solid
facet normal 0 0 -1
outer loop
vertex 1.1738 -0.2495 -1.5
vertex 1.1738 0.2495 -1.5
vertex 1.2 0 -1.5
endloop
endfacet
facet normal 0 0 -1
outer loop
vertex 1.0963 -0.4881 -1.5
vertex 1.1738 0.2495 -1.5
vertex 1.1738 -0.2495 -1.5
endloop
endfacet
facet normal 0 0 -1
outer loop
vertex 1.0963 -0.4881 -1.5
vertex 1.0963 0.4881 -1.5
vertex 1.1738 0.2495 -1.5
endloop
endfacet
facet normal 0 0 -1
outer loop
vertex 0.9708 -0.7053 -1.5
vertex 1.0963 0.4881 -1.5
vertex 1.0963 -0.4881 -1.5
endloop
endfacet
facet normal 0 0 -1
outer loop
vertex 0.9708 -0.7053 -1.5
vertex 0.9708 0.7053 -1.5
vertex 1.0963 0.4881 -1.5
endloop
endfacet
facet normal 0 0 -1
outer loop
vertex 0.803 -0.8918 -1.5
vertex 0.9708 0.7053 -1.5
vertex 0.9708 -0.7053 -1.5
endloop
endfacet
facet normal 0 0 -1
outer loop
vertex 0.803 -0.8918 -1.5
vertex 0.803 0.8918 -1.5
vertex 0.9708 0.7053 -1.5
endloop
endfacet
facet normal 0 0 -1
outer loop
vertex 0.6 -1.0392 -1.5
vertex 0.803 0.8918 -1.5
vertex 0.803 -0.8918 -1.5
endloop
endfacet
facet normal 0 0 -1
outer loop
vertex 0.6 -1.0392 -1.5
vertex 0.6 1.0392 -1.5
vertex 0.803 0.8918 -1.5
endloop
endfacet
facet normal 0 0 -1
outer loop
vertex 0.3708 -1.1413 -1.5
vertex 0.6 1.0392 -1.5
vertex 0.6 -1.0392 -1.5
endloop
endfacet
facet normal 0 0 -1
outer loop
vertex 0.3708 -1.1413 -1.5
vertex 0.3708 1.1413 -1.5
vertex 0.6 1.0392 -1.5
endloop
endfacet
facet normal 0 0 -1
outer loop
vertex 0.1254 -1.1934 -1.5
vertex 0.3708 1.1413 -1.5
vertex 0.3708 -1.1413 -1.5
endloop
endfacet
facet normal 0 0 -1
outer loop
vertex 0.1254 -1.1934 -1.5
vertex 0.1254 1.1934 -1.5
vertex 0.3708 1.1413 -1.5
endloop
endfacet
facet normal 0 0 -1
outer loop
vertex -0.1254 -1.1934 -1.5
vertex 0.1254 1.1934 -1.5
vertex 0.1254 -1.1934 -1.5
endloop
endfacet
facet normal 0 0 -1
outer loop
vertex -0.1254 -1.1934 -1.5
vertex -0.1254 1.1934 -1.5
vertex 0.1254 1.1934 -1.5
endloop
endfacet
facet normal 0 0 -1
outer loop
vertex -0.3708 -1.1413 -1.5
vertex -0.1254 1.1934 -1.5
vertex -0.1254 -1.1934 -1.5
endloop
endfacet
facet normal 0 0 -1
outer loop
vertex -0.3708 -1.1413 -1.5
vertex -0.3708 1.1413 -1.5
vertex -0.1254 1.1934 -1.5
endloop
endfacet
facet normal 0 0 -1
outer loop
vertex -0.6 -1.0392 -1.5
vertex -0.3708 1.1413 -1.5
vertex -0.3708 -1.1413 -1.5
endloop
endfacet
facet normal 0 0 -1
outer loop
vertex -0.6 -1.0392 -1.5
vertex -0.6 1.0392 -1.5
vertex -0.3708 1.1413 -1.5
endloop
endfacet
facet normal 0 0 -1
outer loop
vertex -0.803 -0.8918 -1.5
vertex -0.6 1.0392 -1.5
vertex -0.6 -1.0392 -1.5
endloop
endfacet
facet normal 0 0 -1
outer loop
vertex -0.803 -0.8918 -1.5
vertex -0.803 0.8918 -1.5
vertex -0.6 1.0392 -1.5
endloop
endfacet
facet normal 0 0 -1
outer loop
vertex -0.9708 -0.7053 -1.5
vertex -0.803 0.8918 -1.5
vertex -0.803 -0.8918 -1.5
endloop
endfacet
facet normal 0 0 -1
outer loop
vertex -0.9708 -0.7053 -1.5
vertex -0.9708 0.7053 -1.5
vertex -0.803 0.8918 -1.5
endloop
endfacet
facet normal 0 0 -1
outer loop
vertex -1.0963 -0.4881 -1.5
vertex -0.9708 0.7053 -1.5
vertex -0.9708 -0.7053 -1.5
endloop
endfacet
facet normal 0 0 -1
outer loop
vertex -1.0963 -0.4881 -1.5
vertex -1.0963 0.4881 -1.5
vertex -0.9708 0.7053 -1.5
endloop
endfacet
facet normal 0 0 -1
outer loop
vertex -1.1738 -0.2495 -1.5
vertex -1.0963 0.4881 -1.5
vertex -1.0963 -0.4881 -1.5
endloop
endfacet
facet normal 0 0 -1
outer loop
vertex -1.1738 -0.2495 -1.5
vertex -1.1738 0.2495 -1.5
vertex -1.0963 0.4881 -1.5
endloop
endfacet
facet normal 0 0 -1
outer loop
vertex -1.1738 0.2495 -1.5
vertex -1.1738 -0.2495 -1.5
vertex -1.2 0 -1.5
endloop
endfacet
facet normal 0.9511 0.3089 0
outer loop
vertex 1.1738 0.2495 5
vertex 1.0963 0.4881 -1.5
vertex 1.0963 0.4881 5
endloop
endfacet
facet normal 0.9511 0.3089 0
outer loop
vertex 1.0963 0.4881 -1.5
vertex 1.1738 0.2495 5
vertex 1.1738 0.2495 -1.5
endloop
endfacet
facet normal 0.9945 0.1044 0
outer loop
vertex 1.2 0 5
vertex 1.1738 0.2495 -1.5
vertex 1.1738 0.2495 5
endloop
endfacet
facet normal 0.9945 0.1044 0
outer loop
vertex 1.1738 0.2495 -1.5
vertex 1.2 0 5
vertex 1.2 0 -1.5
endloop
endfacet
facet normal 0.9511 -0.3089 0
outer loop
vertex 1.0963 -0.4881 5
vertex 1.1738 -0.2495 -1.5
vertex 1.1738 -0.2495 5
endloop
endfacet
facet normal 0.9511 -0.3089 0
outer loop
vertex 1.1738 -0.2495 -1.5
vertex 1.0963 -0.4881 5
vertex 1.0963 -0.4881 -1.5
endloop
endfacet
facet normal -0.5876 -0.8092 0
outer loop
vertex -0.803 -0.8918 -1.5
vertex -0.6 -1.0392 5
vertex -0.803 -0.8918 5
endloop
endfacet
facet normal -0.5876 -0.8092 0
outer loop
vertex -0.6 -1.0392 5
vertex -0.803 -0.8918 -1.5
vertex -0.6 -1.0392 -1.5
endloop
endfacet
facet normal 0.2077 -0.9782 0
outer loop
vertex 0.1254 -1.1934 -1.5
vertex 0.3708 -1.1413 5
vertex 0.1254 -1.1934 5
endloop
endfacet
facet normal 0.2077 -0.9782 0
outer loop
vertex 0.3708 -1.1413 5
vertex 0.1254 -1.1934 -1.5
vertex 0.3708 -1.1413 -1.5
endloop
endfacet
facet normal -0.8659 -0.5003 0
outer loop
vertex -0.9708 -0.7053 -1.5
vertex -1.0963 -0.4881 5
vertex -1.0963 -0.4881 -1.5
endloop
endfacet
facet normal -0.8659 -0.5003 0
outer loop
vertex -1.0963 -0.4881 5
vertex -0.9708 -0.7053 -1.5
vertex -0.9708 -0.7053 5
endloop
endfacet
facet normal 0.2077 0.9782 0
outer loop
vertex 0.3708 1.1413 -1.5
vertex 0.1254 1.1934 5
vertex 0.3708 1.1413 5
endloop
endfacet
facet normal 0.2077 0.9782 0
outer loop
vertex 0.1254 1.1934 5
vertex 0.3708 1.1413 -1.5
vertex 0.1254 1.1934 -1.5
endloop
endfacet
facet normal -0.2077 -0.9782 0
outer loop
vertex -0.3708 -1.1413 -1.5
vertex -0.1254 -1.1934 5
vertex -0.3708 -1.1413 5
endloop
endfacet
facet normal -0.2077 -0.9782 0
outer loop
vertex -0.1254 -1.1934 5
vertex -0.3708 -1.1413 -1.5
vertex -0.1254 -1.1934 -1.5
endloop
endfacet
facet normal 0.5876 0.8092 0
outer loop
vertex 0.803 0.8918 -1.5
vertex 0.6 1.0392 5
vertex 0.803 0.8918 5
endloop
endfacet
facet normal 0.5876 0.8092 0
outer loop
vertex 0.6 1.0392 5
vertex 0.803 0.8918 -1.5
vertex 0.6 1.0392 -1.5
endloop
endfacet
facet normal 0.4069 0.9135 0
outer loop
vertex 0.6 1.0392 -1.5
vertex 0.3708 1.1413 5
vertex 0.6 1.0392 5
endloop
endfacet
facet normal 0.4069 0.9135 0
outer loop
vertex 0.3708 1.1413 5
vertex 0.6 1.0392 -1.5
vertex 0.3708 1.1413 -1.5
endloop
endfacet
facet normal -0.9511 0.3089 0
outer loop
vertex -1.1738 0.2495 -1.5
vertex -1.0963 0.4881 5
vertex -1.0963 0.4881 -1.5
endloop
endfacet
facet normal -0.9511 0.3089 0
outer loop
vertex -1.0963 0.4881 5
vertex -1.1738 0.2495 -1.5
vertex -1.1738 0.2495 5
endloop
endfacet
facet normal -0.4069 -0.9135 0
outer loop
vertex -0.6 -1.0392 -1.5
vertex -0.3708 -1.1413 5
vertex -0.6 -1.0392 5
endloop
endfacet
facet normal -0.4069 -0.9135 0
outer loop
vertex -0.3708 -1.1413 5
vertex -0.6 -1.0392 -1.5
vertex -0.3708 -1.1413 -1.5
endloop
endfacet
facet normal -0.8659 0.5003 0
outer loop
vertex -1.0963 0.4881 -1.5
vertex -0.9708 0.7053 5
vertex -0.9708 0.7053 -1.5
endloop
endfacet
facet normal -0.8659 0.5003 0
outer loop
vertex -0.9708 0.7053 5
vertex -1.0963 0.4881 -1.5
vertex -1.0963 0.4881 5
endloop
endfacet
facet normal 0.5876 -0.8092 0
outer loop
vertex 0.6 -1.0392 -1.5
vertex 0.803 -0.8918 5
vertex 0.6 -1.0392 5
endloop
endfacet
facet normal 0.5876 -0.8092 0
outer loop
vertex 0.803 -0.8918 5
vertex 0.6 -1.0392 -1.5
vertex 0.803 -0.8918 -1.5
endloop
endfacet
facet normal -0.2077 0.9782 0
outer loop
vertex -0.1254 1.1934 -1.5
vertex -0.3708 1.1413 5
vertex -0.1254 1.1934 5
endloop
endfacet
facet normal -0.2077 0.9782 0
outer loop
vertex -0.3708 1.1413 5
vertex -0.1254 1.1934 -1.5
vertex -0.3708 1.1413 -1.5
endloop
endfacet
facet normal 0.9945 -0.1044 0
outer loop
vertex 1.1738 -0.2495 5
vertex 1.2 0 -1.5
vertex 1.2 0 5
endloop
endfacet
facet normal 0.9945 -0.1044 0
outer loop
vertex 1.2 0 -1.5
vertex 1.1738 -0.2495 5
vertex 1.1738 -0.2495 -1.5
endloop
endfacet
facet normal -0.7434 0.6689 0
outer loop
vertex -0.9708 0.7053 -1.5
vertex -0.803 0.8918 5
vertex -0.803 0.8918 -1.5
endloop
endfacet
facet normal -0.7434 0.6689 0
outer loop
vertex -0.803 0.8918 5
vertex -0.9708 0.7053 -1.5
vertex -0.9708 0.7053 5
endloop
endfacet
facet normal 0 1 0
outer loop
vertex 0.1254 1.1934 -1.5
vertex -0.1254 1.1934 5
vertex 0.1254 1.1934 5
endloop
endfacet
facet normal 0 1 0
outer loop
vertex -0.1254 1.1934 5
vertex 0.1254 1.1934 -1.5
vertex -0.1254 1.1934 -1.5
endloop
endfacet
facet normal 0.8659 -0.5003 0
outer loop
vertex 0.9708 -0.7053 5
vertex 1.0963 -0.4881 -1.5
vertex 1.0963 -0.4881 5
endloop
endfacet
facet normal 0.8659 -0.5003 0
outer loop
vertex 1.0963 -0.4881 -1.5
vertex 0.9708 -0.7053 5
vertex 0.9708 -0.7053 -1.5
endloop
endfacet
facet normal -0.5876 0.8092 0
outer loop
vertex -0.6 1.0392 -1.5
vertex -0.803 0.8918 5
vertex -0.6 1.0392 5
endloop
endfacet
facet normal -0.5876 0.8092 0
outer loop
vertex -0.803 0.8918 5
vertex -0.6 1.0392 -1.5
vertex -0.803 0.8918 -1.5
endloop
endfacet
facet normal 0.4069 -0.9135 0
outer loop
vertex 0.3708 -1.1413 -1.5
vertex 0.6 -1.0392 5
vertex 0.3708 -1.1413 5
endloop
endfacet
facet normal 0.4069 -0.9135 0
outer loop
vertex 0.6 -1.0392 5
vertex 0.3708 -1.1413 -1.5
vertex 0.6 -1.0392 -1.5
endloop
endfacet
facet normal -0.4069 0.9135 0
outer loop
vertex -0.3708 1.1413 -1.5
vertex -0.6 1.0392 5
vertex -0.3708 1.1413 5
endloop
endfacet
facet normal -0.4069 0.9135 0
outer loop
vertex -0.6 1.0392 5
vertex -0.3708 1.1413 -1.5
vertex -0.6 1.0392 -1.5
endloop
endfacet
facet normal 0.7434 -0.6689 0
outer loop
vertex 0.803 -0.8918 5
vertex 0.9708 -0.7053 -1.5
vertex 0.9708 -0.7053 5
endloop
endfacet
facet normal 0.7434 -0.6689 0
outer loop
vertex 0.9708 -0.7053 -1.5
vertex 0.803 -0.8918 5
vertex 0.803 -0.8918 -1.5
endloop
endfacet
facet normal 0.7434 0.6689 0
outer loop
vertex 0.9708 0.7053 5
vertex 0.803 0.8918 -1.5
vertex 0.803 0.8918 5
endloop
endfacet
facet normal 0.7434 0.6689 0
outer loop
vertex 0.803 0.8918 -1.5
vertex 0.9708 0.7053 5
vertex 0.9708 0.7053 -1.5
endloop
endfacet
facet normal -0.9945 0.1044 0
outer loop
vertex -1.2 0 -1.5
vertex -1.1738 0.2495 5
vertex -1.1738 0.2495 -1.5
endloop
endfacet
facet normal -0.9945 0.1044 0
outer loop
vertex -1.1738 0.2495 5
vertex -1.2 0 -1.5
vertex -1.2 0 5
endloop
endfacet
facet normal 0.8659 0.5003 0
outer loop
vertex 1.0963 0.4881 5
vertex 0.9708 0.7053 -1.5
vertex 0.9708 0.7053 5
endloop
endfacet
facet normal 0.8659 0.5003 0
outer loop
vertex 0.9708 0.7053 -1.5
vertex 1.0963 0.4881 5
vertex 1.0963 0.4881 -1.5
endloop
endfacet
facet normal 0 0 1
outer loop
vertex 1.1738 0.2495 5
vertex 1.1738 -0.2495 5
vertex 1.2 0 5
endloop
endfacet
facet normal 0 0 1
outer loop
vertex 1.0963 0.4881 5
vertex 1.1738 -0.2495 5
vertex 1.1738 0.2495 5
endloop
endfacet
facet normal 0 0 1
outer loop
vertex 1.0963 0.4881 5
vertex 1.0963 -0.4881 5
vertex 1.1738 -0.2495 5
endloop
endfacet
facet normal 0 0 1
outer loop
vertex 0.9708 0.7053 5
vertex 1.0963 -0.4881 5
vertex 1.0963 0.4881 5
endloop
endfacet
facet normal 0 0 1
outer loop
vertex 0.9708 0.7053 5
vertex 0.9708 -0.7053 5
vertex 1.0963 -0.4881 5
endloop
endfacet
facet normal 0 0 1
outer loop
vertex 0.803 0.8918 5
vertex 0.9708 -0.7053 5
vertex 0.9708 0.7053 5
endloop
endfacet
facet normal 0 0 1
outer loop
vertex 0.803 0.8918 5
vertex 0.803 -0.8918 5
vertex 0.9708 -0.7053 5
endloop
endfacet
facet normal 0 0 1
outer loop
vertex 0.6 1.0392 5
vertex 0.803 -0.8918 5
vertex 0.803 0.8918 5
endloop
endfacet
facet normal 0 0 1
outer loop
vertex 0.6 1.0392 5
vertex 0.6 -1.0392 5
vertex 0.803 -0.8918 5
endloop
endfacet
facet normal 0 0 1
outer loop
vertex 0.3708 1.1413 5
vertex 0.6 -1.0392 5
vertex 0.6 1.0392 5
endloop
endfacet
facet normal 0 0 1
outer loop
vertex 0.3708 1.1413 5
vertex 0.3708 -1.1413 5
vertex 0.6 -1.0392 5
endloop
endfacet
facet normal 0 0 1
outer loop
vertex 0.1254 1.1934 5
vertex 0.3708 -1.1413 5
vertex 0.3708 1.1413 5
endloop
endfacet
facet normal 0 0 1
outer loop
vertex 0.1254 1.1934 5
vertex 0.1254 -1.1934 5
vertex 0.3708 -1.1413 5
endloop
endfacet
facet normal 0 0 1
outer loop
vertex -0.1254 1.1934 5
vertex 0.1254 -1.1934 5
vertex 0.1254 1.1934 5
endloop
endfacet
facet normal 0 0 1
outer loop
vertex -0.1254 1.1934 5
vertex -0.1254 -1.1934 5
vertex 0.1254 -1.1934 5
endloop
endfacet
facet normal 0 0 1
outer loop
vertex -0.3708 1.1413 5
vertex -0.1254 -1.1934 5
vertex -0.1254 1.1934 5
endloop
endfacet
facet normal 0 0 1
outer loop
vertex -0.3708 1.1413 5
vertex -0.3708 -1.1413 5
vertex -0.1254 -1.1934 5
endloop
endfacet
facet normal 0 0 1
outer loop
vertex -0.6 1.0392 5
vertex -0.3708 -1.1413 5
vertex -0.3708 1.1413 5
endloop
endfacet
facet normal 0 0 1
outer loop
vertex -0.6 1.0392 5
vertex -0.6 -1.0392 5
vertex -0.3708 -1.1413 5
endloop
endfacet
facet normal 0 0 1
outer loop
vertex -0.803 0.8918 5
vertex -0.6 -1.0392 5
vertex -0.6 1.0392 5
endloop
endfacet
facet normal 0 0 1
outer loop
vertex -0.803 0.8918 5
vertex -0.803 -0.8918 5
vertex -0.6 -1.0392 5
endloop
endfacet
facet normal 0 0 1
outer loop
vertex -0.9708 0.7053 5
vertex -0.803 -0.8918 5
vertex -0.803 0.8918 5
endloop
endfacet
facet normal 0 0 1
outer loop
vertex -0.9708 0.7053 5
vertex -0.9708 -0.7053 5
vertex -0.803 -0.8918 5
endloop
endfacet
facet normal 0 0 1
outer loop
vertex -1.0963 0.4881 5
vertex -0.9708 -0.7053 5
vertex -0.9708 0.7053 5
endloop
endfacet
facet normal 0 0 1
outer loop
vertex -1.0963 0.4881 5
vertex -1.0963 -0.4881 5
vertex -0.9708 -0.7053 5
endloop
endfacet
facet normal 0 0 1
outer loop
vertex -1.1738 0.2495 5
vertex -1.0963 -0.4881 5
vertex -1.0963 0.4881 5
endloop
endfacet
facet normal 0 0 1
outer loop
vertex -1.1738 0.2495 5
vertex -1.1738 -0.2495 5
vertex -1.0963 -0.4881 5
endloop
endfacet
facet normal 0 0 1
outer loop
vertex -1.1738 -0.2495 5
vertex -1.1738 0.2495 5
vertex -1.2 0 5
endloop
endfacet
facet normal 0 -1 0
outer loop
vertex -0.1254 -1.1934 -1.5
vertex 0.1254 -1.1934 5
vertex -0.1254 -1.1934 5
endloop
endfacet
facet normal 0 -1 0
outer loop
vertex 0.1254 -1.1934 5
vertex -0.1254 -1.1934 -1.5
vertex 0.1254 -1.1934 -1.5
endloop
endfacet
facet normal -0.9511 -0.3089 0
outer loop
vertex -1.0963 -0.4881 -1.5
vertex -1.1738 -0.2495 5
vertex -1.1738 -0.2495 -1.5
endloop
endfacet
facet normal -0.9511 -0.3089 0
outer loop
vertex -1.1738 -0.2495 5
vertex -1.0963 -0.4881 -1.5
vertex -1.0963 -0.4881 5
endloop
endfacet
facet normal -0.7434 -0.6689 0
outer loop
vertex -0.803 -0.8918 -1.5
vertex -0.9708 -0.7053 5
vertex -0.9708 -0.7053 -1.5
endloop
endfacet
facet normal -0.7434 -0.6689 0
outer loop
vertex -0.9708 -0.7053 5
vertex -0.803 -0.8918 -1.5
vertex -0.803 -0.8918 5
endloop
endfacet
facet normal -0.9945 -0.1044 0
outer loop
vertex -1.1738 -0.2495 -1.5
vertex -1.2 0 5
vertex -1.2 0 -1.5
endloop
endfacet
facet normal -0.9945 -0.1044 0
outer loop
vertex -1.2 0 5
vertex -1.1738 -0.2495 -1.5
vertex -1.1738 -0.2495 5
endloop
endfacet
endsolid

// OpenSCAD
//vars
    //quality
    $fn=30;
//random numbers for unique boxes
    rand1 = rands(0,3,1)[0];
    rand2 = rands(0,1.2,1)[0];



difference(){ //hole
    cylinder(10,1.2,1.2, center=true); // hole for mounting screw
  
    
//========= KNOB + SHAFT =========
union(){

    //========= KNOB =========
    //we generate a random shape for each render
    translate([5,0,-10])
        linear_extrude(height = 6, twist = rand1+2, slices = 20) 
        {
            minkowski()
            {
                polygon(points=[

                    [-13*rand1,-13*rand2],
                    [-4,13*rand2],
                    [-13,13*rand2],
                    ]);
                    
                    polygon(points=[
                    
                    [rand1,13*rand1],
                    [13+rand1,4],
                    [rand1,-10*rand2],
                    [4,-13*rand1]]);
            }
    }
    //========= SHAFT =========
    difference(){ //shaft
        //shaft
        translate([0,0,-1.5])
        cylinder(6,4.3,4.3, center=true); //cut sides off this cylinder


        difference(){ // cut off sides
            cylinder(3,3.1,3.1, center=true); //cut sides off this cylinder
               difference(){ //sides that need cutting off
                    cylinder(3,3.3,3.3, center=true);
                    cube([4.6,7,4],center=true); 
                }
        }

    }
} //union shaft + knob

  }
    
